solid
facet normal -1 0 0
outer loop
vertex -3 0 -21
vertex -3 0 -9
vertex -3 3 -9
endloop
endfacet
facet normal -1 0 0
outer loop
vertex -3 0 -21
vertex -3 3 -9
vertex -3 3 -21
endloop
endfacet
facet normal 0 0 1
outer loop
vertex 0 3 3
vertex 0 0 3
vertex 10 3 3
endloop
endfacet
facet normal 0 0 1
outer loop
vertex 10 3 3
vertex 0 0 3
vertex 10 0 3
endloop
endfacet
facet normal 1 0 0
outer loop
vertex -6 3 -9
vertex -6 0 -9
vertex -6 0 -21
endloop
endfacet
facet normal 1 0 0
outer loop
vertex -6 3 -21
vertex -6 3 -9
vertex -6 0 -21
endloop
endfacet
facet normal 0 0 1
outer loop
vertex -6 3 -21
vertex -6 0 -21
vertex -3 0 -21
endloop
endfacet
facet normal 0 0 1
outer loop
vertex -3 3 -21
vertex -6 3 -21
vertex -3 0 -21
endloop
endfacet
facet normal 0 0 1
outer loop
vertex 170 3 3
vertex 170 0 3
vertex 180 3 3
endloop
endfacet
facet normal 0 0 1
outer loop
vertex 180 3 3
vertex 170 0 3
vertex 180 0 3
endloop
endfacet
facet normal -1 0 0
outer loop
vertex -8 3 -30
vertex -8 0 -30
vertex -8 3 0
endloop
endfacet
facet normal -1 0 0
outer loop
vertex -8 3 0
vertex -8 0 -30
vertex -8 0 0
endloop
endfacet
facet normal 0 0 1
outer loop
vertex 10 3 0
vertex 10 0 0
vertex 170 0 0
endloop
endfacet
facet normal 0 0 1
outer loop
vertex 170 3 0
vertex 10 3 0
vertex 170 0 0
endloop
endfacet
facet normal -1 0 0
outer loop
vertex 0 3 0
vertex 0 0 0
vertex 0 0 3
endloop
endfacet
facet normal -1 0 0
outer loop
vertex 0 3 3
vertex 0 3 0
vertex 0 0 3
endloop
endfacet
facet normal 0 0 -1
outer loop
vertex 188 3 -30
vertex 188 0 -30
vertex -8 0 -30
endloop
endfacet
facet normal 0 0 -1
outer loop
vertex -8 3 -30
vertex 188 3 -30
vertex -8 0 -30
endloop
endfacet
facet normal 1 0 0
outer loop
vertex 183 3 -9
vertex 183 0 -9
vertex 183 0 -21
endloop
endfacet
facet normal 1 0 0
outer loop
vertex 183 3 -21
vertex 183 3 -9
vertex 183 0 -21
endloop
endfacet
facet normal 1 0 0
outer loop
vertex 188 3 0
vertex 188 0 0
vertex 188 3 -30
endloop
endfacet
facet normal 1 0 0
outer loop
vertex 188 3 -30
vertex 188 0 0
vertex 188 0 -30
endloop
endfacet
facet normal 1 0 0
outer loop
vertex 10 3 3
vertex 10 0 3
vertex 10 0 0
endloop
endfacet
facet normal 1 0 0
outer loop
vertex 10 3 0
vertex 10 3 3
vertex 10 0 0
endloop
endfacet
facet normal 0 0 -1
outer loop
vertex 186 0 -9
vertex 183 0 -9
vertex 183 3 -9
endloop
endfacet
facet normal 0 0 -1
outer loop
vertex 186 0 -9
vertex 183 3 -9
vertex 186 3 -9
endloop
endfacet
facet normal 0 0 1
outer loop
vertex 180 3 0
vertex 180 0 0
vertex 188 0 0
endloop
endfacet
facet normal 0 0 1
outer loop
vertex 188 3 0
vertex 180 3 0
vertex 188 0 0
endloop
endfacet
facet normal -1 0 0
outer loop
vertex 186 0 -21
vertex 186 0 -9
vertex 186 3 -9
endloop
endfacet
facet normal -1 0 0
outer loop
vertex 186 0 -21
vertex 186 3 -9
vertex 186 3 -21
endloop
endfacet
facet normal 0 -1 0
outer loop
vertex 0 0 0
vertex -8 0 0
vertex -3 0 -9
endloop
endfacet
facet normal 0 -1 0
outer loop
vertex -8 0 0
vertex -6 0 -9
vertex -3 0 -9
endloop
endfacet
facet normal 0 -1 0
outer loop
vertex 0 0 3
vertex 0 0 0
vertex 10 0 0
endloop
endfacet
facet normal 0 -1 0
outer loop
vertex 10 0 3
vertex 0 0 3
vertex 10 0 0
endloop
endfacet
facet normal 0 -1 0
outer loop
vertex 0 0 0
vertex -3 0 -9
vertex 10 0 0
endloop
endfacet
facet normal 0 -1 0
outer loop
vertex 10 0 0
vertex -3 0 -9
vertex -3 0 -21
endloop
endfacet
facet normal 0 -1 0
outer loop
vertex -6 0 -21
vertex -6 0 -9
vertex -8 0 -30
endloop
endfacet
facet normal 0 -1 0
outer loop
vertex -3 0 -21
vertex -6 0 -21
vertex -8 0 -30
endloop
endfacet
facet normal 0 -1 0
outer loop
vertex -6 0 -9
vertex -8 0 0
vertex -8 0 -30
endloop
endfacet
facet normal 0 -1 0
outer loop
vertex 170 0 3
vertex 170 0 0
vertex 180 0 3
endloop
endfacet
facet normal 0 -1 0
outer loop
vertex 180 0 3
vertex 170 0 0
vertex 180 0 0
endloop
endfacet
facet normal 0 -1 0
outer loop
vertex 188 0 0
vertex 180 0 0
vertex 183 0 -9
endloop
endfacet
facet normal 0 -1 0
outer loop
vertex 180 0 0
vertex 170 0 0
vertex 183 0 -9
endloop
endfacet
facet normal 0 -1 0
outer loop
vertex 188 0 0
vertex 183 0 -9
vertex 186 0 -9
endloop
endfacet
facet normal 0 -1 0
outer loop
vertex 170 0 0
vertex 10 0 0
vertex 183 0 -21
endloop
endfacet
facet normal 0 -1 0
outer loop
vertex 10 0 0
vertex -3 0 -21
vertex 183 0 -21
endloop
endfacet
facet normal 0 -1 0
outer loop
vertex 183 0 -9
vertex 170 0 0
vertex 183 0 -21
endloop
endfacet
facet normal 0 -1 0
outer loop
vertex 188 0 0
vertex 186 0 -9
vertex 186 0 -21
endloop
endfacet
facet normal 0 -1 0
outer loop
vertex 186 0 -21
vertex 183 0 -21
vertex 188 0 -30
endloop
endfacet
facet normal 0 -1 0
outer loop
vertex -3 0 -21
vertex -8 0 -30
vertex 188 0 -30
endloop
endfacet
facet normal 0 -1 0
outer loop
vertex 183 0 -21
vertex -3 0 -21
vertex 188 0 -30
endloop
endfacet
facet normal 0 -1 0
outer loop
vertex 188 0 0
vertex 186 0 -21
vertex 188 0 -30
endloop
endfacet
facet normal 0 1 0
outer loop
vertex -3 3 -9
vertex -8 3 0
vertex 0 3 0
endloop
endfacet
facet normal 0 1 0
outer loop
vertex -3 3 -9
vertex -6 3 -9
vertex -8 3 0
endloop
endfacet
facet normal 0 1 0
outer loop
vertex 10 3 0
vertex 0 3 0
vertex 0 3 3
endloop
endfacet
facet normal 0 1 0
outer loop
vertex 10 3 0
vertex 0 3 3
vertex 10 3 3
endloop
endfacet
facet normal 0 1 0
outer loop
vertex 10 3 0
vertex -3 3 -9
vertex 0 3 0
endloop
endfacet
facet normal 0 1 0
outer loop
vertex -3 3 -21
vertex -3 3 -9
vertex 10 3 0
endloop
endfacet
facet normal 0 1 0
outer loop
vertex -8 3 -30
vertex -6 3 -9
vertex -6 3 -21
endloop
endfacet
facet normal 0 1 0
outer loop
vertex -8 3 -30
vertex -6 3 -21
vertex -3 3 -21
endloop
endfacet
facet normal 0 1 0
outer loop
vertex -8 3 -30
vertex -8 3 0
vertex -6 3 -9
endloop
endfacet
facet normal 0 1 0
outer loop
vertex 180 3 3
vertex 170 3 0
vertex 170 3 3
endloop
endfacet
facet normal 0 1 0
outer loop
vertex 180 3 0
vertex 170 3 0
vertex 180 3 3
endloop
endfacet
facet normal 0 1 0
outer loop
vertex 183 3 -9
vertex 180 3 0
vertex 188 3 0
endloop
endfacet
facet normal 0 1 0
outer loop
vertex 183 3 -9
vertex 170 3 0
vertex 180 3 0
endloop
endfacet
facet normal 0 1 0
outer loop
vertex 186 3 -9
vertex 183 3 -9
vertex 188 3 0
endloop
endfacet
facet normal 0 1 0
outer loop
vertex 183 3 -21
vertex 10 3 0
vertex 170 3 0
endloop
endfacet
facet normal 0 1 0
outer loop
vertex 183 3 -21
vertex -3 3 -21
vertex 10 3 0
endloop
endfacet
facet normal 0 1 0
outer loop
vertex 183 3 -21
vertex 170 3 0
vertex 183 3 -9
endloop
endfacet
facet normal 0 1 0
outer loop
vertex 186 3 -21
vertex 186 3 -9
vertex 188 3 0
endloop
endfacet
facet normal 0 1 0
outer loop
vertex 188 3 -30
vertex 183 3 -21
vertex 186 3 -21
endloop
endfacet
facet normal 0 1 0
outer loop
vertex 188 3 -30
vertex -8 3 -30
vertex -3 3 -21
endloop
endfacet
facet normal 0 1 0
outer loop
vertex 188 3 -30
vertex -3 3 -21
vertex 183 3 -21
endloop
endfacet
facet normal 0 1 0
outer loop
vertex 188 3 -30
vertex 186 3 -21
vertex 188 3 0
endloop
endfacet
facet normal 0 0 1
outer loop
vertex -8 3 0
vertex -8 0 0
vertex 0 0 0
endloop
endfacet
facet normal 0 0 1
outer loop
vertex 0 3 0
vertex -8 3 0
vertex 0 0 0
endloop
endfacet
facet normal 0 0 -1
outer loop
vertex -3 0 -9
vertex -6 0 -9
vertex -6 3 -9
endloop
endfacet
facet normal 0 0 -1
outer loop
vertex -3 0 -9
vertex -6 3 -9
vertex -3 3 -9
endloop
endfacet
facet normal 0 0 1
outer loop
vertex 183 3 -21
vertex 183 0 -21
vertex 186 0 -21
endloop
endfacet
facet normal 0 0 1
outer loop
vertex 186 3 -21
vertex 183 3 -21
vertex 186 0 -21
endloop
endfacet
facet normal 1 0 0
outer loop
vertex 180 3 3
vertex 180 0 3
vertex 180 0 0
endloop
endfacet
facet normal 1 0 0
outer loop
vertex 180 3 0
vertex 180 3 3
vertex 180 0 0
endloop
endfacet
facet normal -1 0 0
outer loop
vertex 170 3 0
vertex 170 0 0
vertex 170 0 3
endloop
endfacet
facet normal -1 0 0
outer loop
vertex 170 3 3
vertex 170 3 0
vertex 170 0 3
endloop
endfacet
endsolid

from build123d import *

# Parameters (mm, degrees)
SKETCH_1_W      = 3
SKETCH_1_H      = 12
EXTRUDE_1_DEPTH = 3


with BuildPart() as part:
    # 草图1 → 凸台-拉伸1 (new body)
    with BuildSketch(Plane(origin=(0, 0, 0), x_dir=(1, 0, 0), z_dir=(0, 1, 0))):
        Polygon((-8, 30), (-8, 0), (-3, 0), (0, 0), (0, -3), (10, -3), (10, 0), (170, 0), (170, -3), (180, -3), (180, 0), (183, 0), (188, 0), (188, 30), (183, 30), (180, 30), (0, 30), (-3, 30), align=None)
        with Locations((184.5, 15)):
            Rectangle(SKETCH_1_W, SKETCH_1_H, mode=Mode.SUBTRACT)
        with Locations((-4.5, 15)):
            Rectangle(SKETCH_1_W, SKETCH_1_H, mode=Mode.SUBTRACT)
    extrude(amount=EXTRUDE_1_DEPTH)


solid = part.part
